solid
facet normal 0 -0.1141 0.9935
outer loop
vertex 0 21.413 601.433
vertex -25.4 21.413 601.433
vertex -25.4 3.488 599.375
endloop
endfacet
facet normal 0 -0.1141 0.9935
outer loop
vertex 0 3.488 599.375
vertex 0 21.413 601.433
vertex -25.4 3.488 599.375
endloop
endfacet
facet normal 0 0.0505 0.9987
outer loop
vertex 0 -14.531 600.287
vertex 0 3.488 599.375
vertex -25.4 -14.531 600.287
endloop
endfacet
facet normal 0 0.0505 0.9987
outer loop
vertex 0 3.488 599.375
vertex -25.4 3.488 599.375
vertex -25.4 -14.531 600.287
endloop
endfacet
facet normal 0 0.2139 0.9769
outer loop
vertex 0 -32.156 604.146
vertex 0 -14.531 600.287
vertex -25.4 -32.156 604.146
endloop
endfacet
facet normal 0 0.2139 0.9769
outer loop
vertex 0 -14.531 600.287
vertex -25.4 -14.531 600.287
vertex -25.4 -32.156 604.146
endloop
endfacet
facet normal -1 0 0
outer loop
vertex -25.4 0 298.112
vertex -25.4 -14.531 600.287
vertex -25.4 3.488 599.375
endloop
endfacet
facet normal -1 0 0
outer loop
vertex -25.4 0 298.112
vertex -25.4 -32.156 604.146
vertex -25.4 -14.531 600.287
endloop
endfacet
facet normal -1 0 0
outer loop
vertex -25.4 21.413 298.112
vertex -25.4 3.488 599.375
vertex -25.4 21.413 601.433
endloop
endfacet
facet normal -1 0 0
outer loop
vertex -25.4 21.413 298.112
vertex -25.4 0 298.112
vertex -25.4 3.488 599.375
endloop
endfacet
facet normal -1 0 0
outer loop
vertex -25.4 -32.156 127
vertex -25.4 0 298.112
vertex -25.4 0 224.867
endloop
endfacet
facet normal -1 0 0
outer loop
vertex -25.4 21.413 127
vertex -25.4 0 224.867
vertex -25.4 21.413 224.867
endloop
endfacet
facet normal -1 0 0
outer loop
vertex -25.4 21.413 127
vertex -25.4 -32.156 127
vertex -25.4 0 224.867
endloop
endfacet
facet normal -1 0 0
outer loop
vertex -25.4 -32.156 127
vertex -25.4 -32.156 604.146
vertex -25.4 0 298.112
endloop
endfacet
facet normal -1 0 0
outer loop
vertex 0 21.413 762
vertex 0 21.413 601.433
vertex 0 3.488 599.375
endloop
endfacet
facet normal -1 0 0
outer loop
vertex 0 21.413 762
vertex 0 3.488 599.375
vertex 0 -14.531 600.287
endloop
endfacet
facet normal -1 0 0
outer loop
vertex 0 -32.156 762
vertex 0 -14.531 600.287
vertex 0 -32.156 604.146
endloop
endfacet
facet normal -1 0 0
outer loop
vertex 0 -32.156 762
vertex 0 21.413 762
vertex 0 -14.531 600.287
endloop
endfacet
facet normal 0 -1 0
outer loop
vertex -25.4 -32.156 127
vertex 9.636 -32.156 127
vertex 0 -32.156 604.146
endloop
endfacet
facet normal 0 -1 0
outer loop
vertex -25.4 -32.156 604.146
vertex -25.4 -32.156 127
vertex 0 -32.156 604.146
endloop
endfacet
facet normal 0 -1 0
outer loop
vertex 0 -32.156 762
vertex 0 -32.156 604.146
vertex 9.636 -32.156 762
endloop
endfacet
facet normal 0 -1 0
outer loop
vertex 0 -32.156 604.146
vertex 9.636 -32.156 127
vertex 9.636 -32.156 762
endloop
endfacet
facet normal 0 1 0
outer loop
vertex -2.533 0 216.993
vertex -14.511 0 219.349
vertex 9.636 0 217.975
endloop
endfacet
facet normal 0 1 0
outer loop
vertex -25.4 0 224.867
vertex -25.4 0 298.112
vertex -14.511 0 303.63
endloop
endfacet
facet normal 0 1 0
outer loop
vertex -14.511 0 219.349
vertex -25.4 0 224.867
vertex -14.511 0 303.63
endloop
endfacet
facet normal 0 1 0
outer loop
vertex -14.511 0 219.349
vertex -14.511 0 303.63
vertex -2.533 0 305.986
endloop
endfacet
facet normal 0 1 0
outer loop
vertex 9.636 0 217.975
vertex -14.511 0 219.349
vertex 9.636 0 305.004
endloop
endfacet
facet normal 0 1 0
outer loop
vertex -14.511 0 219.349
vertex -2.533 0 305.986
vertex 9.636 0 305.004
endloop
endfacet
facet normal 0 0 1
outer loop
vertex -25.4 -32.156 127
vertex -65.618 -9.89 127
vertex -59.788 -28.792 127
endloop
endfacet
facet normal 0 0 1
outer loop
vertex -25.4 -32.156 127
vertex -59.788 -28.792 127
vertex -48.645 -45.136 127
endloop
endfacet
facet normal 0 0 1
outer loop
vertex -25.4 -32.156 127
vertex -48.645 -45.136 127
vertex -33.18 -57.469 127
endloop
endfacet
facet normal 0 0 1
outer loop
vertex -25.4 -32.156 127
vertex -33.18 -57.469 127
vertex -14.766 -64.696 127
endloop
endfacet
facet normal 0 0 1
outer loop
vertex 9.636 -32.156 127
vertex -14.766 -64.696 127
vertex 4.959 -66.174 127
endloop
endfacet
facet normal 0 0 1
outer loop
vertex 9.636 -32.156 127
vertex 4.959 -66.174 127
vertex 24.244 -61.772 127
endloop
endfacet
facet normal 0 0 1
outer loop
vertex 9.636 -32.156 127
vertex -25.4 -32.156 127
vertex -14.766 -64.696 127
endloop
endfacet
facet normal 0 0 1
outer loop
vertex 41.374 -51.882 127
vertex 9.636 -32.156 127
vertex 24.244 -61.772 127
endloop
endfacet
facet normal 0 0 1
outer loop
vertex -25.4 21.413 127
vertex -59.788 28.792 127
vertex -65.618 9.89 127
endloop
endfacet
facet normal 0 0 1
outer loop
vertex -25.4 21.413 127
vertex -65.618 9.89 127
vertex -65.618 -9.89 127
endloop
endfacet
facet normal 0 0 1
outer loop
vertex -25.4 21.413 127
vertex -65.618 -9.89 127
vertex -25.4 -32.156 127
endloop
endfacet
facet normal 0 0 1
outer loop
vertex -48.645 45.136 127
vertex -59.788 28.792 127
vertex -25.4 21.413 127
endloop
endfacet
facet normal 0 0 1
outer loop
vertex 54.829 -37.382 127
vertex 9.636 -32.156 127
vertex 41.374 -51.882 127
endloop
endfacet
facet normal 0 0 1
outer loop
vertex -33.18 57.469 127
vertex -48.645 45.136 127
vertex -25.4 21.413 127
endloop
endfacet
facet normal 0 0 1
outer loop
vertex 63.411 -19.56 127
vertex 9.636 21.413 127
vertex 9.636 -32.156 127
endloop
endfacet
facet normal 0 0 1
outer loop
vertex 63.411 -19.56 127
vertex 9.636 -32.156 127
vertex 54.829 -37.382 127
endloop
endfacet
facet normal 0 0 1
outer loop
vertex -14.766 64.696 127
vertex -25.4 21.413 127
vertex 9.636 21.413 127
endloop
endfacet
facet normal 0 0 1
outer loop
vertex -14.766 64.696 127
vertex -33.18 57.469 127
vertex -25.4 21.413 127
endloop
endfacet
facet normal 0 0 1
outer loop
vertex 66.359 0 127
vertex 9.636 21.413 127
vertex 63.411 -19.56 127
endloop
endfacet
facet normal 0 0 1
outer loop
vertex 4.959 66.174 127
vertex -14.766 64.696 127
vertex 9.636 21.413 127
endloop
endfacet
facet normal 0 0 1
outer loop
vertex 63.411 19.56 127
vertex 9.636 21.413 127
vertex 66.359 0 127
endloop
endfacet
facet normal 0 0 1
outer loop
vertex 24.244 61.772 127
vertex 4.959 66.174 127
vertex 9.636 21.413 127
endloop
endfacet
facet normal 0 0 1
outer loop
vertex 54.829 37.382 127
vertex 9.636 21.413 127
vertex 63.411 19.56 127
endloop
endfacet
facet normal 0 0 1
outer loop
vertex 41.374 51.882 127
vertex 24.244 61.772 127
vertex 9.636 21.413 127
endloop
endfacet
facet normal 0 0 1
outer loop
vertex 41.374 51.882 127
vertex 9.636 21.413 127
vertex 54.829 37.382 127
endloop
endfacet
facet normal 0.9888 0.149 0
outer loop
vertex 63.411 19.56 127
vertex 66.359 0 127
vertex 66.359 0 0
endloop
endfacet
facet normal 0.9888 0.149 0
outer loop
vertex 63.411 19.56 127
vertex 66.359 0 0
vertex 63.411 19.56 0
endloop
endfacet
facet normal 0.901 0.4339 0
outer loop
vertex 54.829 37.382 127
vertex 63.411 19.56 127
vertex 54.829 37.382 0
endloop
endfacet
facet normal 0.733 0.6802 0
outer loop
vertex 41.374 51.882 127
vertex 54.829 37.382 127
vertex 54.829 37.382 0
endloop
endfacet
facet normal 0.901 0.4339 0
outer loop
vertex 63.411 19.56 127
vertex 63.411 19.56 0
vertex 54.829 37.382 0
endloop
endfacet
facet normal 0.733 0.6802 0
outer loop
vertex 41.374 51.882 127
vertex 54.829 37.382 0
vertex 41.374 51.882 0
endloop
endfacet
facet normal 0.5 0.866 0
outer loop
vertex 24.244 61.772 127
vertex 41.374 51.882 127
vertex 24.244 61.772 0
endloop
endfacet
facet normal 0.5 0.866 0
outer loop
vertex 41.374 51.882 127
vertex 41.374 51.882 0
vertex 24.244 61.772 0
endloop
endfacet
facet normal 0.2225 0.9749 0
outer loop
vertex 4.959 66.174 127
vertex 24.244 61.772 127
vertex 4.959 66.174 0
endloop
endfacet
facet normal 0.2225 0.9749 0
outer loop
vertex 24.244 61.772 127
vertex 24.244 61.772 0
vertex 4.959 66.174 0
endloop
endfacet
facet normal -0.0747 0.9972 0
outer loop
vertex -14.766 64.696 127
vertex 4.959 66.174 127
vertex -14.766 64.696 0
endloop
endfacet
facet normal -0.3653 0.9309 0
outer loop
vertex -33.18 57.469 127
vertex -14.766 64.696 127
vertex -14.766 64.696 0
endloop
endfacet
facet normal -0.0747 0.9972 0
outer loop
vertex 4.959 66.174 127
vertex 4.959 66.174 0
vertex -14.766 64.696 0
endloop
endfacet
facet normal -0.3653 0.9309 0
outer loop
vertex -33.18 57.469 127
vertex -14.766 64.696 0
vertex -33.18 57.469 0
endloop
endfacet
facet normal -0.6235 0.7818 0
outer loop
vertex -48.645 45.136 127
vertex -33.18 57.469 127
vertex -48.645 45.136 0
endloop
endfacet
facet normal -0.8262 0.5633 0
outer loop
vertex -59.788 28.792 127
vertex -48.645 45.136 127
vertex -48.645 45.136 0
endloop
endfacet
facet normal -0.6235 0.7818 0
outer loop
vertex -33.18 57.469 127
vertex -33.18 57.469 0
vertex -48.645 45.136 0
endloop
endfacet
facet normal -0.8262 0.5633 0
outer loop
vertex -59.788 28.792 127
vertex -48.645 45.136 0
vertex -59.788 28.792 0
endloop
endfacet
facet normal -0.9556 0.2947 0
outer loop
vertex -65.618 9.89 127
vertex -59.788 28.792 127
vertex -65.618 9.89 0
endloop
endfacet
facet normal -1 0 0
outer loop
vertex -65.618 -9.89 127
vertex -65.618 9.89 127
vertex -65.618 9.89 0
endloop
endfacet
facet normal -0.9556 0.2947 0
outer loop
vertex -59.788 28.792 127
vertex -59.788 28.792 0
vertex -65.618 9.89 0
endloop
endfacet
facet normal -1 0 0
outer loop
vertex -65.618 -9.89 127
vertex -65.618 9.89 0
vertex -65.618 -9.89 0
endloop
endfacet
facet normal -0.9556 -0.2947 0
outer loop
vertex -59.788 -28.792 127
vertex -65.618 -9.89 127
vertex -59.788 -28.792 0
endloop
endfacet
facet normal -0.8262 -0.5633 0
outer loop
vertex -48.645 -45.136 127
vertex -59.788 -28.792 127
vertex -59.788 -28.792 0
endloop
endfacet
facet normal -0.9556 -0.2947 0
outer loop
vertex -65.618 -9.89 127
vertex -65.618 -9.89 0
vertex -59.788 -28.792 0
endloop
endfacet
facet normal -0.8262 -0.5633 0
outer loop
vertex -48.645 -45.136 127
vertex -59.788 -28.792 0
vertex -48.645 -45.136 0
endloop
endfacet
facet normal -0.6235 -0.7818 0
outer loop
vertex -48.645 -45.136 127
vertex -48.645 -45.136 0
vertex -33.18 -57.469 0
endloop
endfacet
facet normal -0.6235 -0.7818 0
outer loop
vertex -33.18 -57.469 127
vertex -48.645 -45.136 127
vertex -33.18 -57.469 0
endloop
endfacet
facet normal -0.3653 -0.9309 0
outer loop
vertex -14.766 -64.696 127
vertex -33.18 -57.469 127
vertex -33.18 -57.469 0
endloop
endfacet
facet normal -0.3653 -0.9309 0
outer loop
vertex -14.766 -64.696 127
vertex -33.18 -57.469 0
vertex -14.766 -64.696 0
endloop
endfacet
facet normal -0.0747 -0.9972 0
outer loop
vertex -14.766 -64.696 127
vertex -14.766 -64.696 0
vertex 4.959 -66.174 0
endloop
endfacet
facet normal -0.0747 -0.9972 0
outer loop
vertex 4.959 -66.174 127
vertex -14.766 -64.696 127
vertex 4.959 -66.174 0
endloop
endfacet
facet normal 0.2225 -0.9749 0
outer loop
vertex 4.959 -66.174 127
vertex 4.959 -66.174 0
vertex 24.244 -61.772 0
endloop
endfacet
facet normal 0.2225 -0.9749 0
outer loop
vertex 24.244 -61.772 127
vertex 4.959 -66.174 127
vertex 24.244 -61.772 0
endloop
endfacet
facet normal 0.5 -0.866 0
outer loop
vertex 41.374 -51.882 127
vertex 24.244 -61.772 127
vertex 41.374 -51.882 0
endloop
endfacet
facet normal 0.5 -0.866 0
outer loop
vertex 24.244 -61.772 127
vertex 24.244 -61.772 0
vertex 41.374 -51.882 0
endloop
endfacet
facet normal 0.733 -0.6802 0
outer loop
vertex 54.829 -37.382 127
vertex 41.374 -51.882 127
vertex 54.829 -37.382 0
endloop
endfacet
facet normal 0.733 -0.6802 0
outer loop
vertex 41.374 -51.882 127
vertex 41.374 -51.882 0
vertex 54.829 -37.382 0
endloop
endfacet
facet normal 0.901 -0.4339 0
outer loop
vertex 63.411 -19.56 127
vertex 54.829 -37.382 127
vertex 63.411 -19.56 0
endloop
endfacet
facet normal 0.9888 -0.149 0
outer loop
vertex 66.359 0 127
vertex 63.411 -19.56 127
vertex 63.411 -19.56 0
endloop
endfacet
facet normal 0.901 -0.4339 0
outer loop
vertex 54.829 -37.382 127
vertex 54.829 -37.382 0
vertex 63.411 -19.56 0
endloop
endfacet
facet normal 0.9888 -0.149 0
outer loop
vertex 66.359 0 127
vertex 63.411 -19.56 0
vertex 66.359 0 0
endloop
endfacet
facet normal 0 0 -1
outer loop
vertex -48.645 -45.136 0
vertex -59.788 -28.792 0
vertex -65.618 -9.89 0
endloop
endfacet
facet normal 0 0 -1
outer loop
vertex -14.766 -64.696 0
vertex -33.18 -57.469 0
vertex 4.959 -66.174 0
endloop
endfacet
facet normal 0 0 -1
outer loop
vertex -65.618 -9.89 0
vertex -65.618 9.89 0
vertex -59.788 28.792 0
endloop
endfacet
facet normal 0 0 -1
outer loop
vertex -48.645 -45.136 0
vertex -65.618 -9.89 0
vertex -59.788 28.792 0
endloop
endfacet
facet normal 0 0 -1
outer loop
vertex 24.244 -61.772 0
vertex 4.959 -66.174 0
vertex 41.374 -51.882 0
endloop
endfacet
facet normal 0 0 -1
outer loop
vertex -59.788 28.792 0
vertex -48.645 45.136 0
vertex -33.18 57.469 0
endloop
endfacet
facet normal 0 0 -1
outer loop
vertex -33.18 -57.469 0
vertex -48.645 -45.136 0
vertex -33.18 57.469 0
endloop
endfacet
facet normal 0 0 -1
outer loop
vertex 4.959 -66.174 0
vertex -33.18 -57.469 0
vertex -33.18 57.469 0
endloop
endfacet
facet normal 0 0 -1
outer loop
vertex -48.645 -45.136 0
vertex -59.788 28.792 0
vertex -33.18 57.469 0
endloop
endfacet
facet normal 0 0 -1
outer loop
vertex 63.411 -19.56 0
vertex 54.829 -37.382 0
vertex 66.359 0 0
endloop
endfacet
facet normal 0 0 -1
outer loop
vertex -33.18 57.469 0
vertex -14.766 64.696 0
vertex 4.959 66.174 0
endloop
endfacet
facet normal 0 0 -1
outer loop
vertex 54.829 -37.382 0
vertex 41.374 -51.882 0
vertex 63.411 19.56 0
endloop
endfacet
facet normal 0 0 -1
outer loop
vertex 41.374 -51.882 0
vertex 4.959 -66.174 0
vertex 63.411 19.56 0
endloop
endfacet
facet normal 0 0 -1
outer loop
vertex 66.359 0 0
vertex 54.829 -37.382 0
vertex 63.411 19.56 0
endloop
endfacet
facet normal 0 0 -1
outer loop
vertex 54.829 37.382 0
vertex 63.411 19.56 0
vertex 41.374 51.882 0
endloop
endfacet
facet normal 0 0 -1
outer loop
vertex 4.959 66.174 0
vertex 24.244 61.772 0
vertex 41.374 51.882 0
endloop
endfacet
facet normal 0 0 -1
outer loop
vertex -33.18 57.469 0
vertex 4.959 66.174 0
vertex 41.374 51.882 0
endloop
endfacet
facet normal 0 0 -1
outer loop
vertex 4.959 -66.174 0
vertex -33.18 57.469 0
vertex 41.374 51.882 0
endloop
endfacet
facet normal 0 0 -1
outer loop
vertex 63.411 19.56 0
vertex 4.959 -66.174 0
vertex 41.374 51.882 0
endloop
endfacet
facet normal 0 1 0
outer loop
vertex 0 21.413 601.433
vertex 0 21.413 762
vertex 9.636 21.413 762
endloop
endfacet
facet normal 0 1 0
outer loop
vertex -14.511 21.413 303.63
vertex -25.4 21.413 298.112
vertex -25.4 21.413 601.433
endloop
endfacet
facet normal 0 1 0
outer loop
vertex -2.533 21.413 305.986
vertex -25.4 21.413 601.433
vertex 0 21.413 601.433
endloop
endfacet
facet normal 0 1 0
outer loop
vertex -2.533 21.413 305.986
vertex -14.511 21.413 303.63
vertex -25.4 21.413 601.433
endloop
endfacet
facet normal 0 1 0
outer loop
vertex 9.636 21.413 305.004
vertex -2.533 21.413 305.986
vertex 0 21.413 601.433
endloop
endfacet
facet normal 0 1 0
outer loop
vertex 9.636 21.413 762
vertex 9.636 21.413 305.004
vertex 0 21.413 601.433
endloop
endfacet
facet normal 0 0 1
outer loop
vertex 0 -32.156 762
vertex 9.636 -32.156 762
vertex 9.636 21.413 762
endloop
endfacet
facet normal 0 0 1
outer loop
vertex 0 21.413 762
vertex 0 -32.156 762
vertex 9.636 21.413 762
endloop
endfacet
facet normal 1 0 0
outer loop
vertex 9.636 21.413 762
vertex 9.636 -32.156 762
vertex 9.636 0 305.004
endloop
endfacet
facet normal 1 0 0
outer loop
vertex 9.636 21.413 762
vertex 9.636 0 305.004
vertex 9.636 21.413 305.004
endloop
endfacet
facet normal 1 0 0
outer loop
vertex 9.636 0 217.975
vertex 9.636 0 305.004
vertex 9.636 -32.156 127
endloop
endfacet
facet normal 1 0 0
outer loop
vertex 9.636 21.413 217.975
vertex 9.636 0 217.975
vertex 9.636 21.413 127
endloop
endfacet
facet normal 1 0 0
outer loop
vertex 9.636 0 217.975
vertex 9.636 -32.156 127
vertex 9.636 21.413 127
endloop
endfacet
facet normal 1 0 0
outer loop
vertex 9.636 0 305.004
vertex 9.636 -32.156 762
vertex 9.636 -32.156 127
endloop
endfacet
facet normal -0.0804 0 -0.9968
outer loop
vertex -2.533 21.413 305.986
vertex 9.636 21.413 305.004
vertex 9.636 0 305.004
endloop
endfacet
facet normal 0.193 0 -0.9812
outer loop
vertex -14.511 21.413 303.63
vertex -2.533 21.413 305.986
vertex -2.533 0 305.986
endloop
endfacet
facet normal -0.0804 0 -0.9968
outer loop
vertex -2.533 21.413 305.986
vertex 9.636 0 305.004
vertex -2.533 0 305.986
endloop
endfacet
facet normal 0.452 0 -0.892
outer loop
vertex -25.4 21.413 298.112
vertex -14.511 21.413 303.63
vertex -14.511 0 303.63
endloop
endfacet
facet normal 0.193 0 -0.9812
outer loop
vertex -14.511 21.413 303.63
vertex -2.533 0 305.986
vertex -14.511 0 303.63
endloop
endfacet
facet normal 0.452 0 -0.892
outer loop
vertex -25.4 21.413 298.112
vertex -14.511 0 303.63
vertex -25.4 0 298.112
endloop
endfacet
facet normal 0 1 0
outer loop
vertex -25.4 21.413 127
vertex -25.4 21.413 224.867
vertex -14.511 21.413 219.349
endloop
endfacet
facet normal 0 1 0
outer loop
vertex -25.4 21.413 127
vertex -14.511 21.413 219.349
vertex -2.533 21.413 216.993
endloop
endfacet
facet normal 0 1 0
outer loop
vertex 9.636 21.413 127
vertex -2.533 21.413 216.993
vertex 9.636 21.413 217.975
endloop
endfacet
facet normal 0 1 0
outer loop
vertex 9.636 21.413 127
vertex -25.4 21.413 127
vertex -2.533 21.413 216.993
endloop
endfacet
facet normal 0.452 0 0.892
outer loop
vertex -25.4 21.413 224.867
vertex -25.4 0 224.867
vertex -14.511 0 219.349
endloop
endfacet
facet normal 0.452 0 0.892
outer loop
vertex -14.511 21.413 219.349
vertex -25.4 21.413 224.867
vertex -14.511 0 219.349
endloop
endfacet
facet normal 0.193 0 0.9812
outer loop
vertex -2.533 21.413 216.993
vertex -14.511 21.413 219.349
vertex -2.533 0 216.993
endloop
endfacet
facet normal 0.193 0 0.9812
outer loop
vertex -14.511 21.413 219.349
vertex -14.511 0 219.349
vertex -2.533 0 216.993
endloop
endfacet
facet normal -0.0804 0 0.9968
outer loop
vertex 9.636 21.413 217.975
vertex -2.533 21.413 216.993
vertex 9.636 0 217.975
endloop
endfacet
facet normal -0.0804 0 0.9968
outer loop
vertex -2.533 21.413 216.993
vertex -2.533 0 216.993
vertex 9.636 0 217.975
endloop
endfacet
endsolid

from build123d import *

# Parameters (mm, degrees)
F0_R      = 66.359491572
F1_DEPTH  = 101.6
F2_DEPTH  = 25.4
F3_W      = 9.6355099231
F3_H      = 53.5687487572
F4_DEPTH  = 635
F5_DEPTH  = 25.4
F9_DEPTH  = 25.4
F10_R     = 44.5685010644
F11_DEPTH = 25.4


# Not quite as in the source:
# - the program builds the solid bodies; features that only make, move or delete a surface that nothing else refers to are left out


with BuildPart() as f1:
    # F0 (on Top) → F1 (new body)
    with BuildSketch(Plane.XY):
        Circle(F0_R)
    extrude(amount=F1_DEPTH)

    # F2 (add): a face of the model
    f2_faces = [f1.faces().sort_by_distance(p)[0] for p in [
        (0, 0, 101.6),
    ]]
    extrude(f2_faces, amount=F2_DEPTH)

    # F3 (on face) → F4 (join)
    with BuildSketch(Plane.XY.offset(127)):
        with Locations((4.8177549616, -5.3717447445)):
            Rectangle(F3_W, F3_H)
    extrude(amount=F4_DEPTH)

    # F5 (add): a face of the model
    f5_faces = [f1.faces().sort_by_distance(p)[0] for p in [
        (0, -5.3717447445, 444.5),
    ]]
    extrude(f5_faces, amount=F5_DEPTH)

    # F8 (on face) → F9 (cut)
    with BuildSketch(Plane(origin=(-25.4, 0, 0), x_dir=(0, -1, 0), z_dir=(-1, 0, 0))):
        with BuildLine():
            Line((-21.4126296341, 762), (-21.4126296341, 601.4327447423))
            ThreePointArc((-21.4126296341, 601.4327447423), (5.5404234134, 599.4593595949), (32.1561191231, 604.1461558799))
            Line((32.1561191231, 604.1461558799), (32.1561191231, 762))
            Line((32.1561191231, 762), (-21.4126296341, 762))
        make_face()
        with BuildLine():
            ThreePointArc((32.1561191231, 604.1461558799), (88.0808871948, 643.7512740199), (109.5204650209, 708.8395953178))
            ThreePointArc((109.5204650209, 708.8395953178), (-69.4608202642, 793.5150150489), (-21.4126296341, 601.4327447423))
            Line((-21.4126296341, 601.4327447423), (-21.4126296341, 762))
            Line((-21.4126296341, 762), (32.1561191231, 762))
            Line((32.1561191231, 762), (32.1561191231, 604.1461558799))
        make_face()
    extrude(amount=-F9_DEPTH, mode=Mode.SUBTRACT)

    # F10 (on Front) → F11 (cut)
    with BuildSketch(Plane.XZ):
        with Locations((0, 261.4895105362)):
            Circle(F10_R)
    extrude(amount=-F11_DEPTH, mode=Mode.SUBTRACT)


solid = f1.part
